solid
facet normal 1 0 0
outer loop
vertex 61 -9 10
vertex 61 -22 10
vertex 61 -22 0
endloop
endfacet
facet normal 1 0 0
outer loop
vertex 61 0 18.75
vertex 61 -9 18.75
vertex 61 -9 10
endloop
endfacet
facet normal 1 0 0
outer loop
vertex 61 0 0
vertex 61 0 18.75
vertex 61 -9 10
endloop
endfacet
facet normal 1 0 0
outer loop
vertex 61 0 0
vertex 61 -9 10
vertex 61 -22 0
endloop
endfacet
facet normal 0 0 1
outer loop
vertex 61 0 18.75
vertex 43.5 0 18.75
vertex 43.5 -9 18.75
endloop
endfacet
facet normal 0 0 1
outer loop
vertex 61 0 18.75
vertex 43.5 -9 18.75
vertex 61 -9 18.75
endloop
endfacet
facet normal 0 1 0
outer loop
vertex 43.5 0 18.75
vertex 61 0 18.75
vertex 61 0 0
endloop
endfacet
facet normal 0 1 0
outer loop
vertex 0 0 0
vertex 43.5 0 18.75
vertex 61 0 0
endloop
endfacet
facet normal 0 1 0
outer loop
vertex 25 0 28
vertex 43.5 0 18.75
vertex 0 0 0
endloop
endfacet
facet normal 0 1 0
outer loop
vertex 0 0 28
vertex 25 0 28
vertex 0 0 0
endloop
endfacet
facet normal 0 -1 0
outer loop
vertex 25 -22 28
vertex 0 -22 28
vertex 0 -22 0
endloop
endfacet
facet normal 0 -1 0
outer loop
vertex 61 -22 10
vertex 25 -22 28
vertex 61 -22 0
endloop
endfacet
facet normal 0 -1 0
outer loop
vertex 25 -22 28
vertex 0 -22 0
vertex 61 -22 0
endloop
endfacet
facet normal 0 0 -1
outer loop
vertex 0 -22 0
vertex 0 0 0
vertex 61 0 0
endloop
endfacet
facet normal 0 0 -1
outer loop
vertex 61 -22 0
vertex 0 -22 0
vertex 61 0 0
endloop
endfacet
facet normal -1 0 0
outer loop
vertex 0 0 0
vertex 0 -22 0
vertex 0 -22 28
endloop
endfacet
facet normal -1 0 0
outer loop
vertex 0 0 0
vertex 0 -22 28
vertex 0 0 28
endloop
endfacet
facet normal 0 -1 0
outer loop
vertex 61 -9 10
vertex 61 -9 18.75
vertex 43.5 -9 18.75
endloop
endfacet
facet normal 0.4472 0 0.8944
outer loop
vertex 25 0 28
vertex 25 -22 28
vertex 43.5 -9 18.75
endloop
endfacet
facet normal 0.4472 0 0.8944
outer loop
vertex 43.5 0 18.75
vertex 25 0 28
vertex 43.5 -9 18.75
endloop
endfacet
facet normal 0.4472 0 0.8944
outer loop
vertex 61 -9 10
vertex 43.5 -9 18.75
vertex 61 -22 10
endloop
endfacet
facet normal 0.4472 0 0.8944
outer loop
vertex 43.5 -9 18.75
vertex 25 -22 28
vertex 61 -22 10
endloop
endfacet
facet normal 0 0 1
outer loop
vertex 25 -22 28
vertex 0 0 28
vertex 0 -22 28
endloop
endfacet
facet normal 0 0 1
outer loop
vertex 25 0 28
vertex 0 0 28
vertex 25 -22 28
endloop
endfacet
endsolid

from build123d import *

# Parameters (mm, degrees)
F0_W     = 61
F0_H     = 22
F1_DEPTH = 28
F3_DEPTH = 22.001
F5_DEPTH = 9


with BuildPart() as f1:
    # F0 (on Top) → F1 (new body)
    with BuildSketch(Plane.XY):
        with Locations((30.5, -11)):
            Rectangle(F0_W, F0_H)
    extrude(amount=F1_DEPTH)

    # F2 (on face) → F3 (cut, through all)
    with BuildSketch(Plane.XZ.offset(22)):
        Polygon((61, 10), (61, 28), (25, 28), align=None)
    extrude(amount=-F3_DEPTH, mode=Mode.SUBTRACT)

    # F4 (on face) → F5 (join)
    with BuildSketch(Plane(origin=(0, 0, 0), x_dir=(-1, 0, 0), z_dir=(0, 1, 0))):
        Polygon((-61, 18.75), (-61, 10), (-43.5, 18.75), align=None)
    extrude(amount=-F5_DEPTH)


solid = f1.part
